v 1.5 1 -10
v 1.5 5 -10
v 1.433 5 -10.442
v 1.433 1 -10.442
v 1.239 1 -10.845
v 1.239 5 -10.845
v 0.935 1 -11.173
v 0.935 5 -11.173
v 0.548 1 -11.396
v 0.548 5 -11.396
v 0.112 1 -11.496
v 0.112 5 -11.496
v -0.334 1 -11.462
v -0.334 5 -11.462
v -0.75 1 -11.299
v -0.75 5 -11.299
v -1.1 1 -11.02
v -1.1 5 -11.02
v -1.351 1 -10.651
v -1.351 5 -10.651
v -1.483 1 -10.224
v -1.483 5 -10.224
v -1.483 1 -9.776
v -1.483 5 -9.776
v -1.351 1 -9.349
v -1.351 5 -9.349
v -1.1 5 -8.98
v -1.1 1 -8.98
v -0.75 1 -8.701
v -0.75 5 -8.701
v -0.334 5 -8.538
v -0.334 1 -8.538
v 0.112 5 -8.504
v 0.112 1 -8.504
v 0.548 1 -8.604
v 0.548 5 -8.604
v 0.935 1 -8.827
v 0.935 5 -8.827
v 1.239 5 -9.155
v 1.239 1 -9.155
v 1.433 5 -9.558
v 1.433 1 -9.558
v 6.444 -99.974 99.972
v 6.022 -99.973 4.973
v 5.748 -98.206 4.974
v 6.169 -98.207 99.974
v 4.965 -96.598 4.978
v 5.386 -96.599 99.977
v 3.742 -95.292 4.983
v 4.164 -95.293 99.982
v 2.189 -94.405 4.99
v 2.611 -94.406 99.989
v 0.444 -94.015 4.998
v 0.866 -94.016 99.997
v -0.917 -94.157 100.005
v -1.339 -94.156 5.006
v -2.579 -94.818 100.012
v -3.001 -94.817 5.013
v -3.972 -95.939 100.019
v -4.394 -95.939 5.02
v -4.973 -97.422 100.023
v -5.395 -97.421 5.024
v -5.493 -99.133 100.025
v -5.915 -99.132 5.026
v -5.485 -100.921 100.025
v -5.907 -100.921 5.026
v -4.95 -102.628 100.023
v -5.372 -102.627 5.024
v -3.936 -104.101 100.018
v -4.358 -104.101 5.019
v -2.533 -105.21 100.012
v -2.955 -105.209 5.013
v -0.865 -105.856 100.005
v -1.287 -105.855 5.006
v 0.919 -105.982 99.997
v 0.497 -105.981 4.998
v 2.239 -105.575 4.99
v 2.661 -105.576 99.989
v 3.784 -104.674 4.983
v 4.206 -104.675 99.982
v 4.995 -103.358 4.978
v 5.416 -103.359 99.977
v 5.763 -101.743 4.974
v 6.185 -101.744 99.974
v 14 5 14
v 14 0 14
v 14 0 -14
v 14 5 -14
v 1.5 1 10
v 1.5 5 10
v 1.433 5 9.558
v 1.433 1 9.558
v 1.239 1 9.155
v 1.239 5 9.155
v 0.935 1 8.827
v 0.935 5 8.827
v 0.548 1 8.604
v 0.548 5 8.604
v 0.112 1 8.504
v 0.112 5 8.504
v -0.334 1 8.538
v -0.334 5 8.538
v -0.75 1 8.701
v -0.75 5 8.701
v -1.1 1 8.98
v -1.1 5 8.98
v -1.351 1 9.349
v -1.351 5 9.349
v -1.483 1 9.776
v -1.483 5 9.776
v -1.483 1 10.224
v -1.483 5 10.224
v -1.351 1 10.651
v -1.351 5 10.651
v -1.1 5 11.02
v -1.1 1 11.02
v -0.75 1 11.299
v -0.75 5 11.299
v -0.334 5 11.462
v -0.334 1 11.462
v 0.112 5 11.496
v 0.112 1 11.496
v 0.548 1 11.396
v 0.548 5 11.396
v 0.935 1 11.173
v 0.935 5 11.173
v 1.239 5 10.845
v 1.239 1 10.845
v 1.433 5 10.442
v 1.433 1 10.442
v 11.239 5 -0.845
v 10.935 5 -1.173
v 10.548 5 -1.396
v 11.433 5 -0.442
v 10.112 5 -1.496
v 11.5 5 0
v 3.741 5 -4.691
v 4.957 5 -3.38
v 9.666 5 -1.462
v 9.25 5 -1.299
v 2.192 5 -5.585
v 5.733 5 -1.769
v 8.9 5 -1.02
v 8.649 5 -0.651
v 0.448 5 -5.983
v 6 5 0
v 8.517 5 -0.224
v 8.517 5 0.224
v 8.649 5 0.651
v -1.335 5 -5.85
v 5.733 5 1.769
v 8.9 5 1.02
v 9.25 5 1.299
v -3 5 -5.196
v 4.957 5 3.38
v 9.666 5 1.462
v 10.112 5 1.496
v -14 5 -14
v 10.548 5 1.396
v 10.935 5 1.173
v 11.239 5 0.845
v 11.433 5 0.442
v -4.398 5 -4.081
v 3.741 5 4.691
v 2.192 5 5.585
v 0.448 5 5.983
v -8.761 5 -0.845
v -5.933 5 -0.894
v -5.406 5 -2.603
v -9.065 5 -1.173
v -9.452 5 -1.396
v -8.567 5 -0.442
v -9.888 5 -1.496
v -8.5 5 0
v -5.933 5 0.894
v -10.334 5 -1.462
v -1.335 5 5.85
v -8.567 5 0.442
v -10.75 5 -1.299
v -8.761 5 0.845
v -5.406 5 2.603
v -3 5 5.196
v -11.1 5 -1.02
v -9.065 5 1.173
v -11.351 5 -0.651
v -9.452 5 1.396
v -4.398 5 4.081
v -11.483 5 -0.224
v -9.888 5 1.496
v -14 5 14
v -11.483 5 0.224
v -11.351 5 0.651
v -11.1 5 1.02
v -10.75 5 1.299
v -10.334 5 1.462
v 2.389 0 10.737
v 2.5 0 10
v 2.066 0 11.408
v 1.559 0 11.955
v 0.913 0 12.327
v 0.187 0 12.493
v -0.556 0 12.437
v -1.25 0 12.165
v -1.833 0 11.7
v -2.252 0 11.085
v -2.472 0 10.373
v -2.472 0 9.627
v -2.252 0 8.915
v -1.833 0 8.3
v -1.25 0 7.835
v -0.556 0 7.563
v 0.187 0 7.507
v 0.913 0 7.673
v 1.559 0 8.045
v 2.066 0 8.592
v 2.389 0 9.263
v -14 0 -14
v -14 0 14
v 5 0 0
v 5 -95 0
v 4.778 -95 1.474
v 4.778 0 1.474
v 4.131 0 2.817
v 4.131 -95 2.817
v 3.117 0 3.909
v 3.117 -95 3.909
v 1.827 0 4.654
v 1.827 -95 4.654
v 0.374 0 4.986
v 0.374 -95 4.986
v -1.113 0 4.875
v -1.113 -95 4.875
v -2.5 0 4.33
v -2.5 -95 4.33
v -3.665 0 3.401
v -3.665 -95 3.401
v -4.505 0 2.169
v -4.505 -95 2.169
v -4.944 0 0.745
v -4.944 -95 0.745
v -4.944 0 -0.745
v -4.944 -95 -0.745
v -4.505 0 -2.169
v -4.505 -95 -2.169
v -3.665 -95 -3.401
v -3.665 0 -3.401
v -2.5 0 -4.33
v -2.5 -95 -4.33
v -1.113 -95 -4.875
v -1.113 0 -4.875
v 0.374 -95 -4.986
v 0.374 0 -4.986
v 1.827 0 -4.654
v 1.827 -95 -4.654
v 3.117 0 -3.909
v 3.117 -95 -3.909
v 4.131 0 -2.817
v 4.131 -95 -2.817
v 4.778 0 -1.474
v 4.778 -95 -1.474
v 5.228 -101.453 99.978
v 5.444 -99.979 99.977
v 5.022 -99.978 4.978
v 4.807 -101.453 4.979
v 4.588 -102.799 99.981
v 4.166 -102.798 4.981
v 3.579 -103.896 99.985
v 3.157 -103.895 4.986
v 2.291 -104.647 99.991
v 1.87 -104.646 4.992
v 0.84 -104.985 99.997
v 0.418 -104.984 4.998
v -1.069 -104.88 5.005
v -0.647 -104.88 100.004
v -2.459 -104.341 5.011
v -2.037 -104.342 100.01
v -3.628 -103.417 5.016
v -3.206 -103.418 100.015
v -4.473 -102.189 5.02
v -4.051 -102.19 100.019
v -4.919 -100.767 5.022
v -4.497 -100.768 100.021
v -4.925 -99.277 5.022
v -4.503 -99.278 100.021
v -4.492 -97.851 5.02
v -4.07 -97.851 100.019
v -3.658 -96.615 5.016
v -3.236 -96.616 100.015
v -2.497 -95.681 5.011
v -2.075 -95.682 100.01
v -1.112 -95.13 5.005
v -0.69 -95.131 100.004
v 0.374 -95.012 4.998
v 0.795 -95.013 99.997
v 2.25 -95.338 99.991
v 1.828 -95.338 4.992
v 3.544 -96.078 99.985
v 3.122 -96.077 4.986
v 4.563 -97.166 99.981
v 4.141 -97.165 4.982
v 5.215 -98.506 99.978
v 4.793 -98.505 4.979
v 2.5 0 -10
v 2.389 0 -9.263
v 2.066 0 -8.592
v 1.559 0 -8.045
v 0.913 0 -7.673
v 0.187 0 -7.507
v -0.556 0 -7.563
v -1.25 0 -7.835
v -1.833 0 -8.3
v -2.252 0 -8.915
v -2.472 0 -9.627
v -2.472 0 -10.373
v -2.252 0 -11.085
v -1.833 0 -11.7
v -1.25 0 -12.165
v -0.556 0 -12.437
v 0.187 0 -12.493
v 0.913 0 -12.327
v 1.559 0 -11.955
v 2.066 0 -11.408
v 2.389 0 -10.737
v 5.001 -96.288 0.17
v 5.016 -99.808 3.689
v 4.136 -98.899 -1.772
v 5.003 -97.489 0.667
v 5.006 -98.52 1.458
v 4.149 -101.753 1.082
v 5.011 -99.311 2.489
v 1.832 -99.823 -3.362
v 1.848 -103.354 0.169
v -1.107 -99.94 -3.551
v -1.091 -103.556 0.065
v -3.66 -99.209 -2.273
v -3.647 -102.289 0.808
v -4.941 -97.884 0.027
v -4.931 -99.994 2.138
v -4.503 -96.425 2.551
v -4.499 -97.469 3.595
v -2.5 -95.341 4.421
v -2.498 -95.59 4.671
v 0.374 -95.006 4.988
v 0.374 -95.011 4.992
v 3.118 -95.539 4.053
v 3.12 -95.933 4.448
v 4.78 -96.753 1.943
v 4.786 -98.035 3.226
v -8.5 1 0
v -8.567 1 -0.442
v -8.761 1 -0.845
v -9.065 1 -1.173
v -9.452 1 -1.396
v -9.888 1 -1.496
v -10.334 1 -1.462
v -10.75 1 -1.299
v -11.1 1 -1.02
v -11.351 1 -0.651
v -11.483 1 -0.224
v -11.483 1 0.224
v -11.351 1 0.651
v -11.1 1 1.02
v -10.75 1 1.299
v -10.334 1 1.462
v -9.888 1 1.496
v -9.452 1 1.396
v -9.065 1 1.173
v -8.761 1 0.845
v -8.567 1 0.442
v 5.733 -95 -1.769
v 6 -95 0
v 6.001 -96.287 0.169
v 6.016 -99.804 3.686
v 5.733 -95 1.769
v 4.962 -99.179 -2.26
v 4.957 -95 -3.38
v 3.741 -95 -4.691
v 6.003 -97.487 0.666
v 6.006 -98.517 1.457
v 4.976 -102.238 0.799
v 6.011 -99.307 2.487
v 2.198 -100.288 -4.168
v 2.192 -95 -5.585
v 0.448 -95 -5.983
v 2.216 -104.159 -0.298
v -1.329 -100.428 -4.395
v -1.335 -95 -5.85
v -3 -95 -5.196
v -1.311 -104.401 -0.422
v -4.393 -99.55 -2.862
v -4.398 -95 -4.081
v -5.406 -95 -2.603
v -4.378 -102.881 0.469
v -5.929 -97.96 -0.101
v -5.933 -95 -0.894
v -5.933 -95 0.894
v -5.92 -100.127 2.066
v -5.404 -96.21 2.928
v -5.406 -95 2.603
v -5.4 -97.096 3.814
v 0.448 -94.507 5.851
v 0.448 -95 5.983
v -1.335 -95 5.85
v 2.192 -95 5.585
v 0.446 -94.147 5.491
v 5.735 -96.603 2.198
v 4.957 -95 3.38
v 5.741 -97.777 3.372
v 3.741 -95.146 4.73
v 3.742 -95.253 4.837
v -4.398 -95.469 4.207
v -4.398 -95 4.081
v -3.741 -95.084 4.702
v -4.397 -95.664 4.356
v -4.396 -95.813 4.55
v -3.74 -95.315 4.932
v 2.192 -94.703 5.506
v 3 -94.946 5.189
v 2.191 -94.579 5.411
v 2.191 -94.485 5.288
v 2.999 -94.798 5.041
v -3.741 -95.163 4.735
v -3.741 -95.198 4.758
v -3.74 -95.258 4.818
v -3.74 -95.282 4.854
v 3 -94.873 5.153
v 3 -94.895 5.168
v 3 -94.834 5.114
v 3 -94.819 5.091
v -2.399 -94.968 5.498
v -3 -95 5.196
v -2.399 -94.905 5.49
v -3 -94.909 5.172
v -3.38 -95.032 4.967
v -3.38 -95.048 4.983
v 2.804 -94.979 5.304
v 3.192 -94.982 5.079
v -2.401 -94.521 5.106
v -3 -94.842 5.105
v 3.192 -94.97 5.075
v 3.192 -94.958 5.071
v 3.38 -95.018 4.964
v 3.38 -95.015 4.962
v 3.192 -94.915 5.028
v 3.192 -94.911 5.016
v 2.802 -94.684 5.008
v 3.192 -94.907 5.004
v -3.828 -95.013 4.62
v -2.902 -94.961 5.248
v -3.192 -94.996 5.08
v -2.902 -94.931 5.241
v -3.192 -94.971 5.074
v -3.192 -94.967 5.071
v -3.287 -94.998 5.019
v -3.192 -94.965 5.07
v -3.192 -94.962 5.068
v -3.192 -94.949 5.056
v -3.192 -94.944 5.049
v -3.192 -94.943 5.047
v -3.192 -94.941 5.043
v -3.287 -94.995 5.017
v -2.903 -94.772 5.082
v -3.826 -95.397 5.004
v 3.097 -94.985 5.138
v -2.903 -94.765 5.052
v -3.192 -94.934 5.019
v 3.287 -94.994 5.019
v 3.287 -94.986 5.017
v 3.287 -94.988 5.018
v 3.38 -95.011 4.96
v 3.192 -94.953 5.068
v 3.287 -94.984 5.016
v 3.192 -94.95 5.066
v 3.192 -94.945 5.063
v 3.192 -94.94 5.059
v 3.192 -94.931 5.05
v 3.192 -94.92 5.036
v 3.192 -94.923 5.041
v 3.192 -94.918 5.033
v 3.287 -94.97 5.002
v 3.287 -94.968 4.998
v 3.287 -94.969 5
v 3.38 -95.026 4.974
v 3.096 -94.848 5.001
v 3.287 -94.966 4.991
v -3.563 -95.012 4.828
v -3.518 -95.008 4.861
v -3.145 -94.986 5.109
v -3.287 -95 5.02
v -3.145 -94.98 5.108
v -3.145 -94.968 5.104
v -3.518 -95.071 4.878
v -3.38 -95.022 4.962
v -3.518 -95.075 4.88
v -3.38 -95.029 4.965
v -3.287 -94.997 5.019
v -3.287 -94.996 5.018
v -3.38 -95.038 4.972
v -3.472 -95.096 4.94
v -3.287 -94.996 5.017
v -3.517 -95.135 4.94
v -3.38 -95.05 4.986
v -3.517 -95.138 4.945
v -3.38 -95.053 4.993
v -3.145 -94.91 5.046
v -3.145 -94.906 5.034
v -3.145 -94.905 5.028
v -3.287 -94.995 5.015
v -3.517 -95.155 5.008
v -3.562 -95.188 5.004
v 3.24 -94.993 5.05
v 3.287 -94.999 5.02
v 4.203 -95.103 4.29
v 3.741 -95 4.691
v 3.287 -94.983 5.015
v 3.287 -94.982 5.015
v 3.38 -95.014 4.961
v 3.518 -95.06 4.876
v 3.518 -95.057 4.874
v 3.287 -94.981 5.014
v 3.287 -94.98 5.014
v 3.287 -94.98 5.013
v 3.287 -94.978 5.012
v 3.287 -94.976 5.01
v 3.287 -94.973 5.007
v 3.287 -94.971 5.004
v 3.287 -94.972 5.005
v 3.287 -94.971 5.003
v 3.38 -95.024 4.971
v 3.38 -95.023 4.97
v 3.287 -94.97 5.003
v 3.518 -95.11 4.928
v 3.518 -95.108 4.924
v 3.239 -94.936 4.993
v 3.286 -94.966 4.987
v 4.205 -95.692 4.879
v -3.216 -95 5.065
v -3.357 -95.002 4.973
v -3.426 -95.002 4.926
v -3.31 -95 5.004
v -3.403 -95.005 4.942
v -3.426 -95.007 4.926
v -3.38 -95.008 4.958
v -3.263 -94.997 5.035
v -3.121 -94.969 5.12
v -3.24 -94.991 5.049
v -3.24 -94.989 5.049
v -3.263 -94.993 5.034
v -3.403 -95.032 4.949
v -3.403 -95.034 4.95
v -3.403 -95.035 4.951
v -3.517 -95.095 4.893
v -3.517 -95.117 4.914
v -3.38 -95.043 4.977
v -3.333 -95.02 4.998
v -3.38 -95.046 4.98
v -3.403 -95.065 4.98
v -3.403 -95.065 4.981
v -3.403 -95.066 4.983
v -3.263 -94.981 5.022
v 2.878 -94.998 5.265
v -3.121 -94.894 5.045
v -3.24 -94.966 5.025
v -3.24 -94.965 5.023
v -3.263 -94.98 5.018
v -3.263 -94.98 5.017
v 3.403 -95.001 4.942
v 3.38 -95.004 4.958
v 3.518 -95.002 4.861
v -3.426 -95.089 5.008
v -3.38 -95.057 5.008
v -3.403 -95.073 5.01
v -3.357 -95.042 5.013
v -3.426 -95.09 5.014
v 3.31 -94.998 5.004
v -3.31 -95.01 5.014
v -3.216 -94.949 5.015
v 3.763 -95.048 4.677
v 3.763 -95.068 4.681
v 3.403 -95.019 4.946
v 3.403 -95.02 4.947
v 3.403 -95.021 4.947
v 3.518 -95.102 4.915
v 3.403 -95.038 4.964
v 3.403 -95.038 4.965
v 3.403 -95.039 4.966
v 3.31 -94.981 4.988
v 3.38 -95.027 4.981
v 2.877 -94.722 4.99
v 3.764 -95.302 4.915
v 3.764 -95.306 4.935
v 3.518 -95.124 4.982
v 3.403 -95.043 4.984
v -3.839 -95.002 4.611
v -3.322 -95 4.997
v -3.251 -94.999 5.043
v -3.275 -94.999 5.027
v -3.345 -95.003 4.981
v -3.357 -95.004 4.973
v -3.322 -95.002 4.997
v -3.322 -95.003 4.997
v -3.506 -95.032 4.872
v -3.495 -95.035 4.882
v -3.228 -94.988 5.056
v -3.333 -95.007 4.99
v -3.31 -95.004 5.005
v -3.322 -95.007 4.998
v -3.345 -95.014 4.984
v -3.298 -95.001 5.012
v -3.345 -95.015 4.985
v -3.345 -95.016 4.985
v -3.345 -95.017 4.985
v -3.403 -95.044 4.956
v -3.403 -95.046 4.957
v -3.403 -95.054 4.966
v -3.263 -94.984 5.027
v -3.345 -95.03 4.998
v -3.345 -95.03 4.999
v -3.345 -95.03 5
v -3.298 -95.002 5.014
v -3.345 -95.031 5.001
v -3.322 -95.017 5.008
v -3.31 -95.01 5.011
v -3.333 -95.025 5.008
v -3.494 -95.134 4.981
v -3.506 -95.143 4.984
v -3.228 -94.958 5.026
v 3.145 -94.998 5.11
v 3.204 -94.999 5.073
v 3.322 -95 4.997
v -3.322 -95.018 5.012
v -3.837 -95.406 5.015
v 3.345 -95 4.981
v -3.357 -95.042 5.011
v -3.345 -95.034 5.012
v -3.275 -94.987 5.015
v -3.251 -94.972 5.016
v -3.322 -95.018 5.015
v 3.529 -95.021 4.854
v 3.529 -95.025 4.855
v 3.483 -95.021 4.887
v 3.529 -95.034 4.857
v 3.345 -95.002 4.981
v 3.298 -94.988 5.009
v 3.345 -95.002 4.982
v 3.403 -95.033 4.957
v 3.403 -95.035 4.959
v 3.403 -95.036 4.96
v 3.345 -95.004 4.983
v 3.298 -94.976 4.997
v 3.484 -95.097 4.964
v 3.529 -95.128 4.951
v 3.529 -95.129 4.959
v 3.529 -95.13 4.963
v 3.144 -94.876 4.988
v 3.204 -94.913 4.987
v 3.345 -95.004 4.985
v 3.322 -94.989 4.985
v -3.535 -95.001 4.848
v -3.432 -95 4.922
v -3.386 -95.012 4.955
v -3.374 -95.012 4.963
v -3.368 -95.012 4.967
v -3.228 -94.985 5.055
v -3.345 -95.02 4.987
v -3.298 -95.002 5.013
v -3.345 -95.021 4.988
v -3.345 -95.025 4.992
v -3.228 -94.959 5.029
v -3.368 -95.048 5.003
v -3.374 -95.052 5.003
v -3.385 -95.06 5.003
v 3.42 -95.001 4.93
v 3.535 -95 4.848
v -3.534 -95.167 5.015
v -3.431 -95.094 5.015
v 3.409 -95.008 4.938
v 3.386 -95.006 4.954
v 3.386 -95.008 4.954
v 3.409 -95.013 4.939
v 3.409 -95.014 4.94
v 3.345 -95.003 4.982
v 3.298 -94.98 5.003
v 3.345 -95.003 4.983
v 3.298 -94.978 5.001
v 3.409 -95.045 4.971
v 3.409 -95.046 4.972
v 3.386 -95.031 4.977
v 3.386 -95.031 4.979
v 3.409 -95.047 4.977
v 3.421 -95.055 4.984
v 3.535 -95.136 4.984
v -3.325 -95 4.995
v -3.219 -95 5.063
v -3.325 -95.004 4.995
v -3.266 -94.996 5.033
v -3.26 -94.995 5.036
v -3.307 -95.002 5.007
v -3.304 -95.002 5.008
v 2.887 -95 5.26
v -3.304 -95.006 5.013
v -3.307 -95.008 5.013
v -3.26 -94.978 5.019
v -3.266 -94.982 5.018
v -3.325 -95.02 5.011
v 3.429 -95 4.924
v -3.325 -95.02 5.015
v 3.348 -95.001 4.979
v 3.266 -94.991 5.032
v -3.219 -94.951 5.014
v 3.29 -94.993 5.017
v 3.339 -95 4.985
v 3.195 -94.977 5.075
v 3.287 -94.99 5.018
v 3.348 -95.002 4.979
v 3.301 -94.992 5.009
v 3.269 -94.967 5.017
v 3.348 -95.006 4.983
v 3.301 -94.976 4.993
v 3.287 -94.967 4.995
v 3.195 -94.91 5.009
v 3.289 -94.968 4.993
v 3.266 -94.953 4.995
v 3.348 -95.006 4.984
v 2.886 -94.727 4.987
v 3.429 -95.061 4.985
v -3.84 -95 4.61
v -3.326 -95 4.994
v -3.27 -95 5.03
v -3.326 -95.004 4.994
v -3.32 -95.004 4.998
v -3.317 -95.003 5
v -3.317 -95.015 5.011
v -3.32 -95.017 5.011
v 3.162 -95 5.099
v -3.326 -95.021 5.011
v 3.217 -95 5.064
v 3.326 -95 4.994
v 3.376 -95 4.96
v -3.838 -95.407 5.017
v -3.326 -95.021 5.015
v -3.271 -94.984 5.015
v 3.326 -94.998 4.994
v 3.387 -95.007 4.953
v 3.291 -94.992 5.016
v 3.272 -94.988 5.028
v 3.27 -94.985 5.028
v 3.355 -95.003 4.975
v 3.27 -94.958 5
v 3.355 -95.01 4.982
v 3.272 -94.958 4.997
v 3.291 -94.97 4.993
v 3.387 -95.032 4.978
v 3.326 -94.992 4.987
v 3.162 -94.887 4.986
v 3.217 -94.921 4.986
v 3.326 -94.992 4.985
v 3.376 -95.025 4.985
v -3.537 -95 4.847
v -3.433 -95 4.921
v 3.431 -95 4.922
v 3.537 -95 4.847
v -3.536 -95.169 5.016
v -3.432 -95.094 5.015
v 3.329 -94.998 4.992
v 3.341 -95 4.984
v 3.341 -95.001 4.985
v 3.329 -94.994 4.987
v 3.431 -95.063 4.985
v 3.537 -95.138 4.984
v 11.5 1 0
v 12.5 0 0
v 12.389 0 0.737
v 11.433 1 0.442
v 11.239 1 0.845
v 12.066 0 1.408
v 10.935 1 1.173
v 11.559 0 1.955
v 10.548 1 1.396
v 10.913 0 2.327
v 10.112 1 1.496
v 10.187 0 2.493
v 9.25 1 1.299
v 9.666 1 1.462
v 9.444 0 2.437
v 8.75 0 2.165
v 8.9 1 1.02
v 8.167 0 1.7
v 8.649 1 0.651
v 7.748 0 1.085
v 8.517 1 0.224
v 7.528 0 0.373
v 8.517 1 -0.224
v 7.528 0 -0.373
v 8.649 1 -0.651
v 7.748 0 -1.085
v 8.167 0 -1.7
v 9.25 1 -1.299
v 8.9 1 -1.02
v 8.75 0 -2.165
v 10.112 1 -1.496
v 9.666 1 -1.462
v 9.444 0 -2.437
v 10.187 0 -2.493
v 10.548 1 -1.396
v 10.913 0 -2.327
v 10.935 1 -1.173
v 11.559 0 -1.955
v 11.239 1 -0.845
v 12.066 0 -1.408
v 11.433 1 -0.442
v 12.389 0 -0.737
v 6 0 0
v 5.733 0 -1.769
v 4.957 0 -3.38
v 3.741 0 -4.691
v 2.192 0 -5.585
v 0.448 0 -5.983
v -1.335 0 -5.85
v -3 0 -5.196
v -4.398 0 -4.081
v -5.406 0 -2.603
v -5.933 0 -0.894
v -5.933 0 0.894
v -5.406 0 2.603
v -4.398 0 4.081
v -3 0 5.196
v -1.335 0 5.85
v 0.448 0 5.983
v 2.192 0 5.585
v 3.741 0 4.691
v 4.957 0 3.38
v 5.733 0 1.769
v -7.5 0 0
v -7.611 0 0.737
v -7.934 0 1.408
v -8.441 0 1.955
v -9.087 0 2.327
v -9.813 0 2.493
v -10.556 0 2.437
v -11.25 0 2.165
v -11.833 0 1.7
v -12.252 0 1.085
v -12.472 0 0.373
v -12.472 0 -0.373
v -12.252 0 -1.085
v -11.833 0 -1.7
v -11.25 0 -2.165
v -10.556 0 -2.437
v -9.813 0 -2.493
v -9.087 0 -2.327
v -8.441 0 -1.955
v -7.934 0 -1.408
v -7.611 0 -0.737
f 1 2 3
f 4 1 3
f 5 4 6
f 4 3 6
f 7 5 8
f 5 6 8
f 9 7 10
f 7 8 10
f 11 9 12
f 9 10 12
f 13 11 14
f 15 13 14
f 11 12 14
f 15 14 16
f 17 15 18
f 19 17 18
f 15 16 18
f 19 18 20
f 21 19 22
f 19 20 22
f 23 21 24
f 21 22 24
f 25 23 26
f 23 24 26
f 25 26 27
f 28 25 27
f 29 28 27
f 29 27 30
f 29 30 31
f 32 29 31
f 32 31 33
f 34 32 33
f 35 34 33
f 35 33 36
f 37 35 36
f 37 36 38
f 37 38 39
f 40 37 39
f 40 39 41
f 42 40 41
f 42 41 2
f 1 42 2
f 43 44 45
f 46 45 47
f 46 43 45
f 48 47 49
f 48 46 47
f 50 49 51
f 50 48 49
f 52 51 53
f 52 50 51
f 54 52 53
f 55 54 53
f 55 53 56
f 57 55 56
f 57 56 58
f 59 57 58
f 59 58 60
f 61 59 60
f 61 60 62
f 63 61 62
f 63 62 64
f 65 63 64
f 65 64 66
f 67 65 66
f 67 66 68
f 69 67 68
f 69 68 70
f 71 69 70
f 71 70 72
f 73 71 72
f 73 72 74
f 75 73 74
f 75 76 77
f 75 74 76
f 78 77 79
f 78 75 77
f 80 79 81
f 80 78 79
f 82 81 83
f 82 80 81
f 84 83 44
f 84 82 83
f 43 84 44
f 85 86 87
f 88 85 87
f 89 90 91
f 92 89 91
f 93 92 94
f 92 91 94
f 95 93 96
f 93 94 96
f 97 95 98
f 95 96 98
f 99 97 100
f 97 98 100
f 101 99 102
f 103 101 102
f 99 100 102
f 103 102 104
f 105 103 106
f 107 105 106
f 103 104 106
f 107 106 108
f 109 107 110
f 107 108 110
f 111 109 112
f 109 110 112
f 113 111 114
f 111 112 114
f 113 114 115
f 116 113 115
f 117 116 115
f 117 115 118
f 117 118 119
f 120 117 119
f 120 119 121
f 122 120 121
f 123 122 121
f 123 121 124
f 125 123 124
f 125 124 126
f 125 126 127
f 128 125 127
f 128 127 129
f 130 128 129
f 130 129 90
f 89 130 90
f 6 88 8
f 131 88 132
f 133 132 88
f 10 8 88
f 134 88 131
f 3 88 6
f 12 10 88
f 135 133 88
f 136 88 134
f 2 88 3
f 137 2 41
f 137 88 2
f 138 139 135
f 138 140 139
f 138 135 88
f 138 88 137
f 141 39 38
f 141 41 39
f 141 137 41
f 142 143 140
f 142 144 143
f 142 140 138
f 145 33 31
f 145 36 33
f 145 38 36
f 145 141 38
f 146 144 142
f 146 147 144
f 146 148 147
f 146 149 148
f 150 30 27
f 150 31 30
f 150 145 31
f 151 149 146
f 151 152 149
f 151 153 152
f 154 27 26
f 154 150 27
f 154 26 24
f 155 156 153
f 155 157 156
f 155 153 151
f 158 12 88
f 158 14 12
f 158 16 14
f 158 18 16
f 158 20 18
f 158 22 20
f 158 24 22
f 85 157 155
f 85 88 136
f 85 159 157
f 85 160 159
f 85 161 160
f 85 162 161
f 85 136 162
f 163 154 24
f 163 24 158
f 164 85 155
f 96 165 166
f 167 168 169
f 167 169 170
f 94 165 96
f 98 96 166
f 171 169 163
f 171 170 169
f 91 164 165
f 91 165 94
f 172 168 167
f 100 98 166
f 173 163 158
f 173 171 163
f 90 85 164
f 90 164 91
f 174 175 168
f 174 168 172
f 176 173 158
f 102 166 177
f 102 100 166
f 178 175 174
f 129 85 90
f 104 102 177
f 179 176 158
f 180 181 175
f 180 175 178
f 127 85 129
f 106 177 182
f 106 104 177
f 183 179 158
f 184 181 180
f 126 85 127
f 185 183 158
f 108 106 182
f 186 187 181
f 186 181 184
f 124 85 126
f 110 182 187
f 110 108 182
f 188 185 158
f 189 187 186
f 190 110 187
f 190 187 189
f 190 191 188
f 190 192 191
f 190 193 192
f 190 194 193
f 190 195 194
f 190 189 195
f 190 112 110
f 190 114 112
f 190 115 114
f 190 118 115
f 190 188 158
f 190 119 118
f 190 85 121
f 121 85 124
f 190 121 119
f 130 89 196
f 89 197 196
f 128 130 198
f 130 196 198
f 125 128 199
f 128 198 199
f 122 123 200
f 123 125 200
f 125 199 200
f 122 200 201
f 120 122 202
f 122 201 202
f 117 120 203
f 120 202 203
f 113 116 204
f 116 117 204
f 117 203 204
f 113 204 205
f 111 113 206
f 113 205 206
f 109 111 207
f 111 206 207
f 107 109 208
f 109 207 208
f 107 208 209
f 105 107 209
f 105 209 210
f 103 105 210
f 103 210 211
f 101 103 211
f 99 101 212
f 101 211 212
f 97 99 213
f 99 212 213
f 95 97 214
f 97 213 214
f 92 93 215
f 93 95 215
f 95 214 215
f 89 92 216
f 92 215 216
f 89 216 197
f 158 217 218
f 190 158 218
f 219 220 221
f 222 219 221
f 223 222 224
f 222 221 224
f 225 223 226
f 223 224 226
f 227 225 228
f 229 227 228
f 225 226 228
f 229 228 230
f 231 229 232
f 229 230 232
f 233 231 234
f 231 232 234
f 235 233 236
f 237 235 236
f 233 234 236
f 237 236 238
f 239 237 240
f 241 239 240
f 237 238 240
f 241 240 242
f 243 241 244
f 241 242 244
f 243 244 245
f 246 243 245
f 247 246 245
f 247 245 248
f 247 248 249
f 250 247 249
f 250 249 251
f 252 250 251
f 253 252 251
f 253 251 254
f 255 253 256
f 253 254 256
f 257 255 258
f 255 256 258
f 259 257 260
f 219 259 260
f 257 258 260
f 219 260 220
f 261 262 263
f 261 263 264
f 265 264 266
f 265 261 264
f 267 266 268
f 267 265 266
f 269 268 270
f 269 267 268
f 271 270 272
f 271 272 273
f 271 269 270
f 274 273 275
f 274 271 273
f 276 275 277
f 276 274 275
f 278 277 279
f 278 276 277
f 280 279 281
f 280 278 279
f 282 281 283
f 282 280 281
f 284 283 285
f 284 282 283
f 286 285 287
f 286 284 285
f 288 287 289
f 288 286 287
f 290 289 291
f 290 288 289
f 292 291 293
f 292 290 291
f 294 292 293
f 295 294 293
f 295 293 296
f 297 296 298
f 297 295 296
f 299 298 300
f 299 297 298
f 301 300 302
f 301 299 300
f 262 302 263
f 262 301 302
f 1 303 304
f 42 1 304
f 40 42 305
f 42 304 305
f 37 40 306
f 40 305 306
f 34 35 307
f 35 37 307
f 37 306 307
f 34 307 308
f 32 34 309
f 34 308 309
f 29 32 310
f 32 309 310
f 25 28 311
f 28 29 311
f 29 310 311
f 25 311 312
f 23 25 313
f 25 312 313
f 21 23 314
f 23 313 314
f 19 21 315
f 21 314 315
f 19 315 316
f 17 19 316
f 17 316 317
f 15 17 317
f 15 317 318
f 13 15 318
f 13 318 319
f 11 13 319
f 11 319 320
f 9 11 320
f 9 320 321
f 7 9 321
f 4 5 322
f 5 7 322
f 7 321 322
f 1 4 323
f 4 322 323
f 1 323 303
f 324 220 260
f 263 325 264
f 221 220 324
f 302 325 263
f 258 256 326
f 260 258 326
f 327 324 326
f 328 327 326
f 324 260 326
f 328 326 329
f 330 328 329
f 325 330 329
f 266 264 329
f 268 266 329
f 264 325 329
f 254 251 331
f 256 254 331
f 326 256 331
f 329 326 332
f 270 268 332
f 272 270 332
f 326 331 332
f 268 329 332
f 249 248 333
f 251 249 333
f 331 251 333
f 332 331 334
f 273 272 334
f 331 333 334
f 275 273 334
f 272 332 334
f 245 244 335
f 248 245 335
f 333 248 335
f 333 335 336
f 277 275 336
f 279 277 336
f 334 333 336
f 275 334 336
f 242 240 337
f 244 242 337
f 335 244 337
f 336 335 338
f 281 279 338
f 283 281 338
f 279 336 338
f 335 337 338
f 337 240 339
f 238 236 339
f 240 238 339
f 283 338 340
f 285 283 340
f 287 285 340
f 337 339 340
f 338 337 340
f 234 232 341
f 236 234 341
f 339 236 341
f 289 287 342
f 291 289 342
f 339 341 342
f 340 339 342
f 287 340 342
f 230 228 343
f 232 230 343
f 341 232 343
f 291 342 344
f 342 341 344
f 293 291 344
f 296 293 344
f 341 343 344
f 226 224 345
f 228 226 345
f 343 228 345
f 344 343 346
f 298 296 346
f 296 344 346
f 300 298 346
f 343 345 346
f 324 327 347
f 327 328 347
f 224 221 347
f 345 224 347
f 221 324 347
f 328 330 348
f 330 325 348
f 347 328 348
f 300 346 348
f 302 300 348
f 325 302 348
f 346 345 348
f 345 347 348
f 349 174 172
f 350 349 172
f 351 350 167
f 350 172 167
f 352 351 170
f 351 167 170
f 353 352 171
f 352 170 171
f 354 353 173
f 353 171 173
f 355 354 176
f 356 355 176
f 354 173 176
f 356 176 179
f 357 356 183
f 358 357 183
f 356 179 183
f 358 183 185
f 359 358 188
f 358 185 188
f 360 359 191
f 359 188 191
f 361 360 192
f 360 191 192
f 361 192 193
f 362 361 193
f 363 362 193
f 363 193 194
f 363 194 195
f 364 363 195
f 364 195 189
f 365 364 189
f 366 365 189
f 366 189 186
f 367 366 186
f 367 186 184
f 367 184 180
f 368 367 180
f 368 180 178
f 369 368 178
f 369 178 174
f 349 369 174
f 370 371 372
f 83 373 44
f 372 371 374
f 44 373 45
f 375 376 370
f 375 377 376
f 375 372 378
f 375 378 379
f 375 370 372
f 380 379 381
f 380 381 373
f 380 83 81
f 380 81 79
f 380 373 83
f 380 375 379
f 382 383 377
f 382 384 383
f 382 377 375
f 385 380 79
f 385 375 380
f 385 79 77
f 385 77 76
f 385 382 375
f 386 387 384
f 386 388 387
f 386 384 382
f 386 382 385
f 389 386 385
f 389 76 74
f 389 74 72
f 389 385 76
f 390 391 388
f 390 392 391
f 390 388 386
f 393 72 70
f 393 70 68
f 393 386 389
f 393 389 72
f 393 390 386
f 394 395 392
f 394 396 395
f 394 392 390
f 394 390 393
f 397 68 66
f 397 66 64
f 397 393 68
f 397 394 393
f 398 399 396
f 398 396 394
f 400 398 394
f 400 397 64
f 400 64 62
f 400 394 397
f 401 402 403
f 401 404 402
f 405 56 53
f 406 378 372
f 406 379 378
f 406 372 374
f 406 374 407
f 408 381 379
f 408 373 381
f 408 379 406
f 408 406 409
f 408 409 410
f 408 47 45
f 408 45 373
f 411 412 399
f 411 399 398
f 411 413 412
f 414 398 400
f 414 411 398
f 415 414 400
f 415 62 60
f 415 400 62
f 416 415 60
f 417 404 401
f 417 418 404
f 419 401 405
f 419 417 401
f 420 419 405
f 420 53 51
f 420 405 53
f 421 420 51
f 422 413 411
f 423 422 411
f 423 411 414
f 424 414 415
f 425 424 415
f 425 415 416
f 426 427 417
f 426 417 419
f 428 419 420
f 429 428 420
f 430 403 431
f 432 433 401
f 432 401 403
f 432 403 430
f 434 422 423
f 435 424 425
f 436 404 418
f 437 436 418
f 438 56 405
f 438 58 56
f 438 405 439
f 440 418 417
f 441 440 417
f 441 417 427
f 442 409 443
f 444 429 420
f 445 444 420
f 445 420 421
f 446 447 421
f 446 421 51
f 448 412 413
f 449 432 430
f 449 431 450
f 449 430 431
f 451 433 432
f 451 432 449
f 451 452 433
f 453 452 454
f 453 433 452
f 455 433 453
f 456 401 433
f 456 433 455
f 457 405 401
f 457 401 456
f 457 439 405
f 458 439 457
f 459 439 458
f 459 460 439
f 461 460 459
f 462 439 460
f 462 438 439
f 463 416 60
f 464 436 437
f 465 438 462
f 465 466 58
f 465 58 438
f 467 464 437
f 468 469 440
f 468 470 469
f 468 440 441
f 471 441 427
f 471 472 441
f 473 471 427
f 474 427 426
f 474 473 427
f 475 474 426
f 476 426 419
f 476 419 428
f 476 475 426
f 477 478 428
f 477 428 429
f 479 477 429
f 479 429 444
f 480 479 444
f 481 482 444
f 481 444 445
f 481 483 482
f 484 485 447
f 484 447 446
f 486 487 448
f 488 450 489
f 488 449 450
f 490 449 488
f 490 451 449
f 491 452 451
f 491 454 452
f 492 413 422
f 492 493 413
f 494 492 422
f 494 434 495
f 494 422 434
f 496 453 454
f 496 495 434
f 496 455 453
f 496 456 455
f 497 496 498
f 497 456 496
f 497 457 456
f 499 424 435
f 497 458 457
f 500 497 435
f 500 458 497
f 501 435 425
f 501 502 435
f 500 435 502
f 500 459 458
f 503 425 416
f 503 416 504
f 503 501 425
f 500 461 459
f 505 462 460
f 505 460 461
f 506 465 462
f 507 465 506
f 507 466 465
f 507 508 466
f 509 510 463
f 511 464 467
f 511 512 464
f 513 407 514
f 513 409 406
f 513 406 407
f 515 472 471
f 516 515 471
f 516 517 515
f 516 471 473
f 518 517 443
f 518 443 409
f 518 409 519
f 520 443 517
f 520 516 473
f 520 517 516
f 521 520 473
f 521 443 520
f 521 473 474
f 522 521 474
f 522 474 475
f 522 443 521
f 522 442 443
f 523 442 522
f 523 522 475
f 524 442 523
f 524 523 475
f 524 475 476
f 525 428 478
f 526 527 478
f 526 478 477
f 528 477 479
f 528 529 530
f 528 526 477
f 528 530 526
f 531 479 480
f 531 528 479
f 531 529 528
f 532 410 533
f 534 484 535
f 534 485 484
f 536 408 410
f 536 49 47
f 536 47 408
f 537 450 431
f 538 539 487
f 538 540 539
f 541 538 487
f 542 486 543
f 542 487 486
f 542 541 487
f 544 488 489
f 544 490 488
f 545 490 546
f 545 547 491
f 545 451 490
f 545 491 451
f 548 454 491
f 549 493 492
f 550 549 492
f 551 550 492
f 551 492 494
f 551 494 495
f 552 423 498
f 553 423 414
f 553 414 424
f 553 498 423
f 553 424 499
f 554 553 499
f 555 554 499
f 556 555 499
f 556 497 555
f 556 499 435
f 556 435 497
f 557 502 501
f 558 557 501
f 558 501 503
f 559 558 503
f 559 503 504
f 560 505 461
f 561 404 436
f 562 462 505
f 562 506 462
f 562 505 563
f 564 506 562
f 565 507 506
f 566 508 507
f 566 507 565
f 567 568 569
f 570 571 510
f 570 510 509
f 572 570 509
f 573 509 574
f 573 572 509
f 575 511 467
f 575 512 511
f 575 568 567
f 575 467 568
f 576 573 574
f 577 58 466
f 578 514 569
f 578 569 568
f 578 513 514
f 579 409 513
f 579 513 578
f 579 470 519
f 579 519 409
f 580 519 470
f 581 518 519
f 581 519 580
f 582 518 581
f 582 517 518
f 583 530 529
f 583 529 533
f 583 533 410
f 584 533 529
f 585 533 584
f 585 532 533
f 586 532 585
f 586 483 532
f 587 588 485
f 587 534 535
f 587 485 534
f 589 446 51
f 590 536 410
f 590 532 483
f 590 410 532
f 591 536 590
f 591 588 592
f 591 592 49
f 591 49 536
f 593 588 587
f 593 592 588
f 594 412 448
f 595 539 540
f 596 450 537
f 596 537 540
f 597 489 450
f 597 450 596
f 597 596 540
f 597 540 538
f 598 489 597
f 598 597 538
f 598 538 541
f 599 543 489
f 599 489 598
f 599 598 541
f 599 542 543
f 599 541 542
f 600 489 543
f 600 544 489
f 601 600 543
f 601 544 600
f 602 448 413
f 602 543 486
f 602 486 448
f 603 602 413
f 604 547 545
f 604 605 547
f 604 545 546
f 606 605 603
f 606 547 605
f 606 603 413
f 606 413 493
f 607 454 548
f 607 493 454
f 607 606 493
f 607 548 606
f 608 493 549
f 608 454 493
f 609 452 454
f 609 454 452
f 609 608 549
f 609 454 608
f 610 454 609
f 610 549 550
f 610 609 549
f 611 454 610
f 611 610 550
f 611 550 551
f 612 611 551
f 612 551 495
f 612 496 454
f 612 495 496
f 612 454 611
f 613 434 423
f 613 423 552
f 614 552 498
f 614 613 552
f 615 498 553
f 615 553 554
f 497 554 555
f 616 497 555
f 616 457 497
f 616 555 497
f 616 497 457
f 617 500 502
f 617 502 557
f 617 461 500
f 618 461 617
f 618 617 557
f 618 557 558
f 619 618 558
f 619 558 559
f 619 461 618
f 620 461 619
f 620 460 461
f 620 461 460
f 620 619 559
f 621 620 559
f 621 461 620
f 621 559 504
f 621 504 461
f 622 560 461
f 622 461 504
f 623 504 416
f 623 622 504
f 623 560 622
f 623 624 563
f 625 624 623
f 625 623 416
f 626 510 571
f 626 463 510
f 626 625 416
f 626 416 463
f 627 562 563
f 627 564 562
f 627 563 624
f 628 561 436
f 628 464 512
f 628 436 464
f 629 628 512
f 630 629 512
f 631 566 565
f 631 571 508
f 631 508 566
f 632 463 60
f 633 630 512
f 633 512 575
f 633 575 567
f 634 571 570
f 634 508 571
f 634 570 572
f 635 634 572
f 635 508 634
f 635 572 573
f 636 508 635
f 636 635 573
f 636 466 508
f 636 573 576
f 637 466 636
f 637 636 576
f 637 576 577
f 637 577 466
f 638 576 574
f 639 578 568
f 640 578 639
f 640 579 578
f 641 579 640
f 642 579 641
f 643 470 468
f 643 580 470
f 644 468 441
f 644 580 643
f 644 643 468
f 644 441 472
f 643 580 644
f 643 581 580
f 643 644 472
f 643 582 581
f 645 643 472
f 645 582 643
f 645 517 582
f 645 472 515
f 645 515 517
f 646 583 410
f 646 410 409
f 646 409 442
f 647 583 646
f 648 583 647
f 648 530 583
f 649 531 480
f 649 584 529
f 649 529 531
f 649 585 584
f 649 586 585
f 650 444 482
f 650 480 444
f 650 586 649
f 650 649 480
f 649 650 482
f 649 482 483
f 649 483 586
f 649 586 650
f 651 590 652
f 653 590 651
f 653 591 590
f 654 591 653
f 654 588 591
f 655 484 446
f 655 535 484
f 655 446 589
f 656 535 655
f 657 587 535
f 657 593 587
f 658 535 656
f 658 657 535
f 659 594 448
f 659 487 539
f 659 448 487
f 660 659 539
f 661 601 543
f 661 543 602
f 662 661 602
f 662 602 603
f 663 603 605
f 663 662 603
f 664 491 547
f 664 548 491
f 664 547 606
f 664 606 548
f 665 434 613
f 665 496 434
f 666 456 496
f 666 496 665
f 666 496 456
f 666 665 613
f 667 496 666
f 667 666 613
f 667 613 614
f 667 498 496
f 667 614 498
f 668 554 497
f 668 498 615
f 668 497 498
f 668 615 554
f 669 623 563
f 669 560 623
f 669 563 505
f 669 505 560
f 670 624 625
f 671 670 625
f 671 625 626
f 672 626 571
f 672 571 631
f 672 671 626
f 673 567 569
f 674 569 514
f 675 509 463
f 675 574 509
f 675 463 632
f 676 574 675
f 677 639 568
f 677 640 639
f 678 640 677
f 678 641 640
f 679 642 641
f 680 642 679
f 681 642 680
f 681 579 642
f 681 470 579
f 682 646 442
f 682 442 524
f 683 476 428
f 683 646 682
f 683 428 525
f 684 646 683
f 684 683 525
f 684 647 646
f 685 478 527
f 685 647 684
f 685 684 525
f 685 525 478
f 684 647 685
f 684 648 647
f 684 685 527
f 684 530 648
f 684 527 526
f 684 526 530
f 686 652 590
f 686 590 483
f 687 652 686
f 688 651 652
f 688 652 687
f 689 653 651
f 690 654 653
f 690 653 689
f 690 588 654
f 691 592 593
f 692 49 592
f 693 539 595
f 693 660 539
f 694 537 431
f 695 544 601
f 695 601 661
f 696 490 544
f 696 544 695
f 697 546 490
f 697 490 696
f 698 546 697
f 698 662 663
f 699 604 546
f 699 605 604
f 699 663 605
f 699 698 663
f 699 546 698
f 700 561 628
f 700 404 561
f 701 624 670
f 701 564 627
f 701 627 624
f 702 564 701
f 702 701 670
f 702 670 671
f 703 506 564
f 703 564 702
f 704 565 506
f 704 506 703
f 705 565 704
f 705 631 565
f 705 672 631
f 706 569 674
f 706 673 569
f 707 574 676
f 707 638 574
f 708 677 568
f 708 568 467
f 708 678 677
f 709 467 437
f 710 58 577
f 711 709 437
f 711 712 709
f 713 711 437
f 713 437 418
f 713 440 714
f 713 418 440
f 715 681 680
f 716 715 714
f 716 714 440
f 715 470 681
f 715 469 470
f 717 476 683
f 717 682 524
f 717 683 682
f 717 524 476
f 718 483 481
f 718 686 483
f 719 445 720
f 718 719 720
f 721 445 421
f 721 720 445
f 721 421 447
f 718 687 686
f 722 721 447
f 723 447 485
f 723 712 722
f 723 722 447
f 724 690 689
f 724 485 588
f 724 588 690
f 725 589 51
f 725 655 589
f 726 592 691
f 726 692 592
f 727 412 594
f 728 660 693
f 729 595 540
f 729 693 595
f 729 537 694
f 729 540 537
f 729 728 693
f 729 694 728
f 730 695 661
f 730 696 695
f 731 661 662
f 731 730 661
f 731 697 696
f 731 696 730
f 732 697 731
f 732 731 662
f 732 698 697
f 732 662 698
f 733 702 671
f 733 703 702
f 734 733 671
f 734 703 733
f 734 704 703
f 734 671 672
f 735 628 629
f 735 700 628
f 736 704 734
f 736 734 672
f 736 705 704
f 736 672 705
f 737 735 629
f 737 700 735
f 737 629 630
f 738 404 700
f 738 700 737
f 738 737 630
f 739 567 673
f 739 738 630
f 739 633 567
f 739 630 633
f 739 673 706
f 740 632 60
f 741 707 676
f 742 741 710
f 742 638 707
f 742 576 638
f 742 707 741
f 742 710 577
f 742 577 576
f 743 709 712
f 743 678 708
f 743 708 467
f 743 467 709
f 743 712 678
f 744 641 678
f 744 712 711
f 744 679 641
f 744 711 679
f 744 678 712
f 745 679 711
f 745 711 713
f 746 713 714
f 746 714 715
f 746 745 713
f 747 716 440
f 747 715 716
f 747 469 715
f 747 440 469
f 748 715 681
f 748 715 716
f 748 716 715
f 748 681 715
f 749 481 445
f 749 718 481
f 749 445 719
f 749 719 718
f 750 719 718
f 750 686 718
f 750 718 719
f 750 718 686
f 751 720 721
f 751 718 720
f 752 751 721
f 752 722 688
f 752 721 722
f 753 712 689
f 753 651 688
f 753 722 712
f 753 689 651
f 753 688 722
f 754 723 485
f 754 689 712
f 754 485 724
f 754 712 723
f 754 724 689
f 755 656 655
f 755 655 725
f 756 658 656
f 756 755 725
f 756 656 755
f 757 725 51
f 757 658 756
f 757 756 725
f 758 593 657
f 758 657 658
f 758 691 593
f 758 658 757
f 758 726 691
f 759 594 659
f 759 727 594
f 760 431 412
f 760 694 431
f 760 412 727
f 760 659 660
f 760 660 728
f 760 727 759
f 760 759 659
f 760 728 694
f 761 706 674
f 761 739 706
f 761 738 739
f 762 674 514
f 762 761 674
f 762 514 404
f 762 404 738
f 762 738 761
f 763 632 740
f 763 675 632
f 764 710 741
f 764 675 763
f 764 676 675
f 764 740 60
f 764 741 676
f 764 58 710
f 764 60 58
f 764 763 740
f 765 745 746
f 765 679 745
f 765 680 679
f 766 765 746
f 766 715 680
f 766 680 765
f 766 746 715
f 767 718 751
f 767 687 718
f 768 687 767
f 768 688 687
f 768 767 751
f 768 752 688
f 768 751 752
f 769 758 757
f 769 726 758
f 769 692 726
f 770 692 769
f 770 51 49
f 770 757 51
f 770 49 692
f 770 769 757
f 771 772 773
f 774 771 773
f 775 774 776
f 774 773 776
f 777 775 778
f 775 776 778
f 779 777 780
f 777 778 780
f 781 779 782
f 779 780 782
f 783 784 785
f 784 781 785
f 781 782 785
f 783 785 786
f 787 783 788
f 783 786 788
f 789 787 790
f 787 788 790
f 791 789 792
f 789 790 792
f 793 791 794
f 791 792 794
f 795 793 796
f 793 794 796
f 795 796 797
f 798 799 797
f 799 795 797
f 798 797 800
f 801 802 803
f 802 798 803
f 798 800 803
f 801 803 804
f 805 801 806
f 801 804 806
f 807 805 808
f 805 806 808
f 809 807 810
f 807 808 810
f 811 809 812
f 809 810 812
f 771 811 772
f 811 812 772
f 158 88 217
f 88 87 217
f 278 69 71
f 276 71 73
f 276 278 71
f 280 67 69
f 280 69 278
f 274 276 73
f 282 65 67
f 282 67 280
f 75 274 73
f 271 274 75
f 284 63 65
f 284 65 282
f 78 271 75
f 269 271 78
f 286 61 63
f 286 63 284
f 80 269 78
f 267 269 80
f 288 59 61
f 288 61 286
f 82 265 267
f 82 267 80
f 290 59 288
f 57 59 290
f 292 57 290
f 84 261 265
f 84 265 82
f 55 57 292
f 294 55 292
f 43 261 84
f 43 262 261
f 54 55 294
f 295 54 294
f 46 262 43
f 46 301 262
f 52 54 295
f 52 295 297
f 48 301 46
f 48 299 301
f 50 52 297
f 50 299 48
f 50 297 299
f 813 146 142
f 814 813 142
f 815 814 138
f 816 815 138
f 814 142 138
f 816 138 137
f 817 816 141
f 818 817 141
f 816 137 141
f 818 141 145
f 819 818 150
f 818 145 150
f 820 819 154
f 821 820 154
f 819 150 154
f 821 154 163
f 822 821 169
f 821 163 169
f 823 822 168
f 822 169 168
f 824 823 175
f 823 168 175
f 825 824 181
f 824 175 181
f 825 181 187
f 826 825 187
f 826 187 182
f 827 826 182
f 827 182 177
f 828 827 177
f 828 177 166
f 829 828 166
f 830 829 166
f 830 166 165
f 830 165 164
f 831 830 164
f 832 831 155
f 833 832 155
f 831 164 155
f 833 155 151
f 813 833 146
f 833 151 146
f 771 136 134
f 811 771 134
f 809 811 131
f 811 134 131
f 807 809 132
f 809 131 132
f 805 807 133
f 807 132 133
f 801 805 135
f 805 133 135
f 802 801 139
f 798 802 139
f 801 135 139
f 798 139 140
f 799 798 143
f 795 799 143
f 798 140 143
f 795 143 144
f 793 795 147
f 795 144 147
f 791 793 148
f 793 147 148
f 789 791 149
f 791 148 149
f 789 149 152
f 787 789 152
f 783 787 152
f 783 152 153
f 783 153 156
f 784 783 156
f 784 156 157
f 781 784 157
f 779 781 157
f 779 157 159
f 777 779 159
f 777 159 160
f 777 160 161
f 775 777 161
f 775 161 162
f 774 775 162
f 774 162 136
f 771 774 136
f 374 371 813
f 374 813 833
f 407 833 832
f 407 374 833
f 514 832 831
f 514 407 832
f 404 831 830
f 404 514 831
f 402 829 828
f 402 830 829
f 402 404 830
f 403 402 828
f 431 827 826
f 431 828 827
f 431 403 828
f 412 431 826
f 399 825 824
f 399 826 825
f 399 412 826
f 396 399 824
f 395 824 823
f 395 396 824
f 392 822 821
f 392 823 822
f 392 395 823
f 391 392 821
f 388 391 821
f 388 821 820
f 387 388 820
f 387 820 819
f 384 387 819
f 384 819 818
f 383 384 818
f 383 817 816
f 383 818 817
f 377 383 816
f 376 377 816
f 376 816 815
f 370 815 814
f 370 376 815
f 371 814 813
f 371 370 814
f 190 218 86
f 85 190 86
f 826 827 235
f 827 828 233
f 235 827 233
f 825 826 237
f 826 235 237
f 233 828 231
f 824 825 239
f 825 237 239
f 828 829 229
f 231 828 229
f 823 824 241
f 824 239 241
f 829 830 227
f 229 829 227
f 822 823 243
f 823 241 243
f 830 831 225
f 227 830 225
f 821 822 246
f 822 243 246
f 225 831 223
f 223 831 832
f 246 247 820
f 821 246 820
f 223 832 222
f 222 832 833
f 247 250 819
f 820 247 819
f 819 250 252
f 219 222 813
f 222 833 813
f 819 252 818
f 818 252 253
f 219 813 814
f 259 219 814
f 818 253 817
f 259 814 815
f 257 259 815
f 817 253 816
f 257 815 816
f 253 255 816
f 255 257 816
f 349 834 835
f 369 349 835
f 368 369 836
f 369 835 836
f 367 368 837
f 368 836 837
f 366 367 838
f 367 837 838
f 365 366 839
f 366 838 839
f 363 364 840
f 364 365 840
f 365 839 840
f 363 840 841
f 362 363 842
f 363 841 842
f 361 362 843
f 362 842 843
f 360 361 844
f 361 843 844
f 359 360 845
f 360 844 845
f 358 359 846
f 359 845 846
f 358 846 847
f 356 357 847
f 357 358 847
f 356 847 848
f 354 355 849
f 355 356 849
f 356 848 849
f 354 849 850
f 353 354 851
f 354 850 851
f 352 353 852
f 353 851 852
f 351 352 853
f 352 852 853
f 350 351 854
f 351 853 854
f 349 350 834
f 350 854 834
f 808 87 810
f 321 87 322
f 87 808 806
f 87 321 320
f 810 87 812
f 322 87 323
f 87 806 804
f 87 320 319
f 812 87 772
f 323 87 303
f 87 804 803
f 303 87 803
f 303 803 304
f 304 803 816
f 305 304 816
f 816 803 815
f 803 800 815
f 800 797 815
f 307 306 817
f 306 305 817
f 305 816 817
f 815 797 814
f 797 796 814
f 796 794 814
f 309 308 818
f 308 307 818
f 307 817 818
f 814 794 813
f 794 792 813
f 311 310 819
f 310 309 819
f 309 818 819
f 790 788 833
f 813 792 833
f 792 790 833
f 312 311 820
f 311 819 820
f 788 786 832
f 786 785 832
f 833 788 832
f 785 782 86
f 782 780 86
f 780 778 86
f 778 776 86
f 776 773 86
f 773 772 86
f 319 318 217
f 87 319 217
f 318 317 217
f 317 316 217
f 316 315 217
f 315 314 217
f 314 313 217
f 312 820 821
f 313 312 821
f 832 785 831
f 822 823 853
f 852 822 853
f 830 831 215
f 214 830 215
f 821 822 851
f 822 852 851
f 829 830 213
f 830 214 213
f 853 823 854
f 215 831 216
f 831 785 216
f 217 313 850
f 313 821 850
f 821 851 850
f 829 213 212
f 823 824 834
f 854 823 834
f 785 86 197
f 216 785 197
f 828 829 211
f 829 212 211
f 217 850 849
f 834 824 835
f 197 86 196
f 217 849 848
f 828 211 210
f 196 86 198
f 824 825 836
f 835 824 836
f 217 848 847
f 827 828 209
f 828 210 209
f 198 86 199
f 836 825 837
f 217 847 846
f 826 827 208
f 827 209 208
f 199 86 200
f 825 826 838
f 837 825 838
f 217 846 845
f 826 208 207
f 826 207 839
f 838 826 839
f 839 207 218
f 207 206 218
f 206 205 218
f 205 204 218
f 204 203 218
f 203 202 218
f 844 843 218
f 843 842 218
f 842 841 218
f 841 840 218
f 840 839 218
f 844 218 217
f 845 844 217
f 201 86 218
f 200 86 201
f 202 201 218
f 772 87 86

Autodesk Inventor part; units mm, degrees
ref_plane "YZ Plane" through (0, 0, 0) normal (1, 0, 0) x (0, 1, 0)
ref_plane "XZ Plane" through (0, 0, 0) normal (0, 1, 0) x (-1, 0, 0)
ref_plane "XY Plane" through (0, 0, 0) normal (0, 0, 1) x (1, 0, 0)
sketch "Sketch1" plane through (0, 0, 0) normal (0, 1, 0) x (-1, 0, 0)
  line L0 (14, 14) -> (-14, 14)
  line L1 (-14, 14) -> (-14, -14)
  line L2 (-14, -14) -> (14, -14)
  line L3 (14, -14) -> (14, 14)
  point P0 (0, 0)
  point P1 (0, -14)
  dimension "d0" = 28
  dimension "d1" = 28
  dimension "d2" = 14
  dimension "d3" = 14
extrude "Extrusion1" add sketch "Sketch1" along normal blind 5
sketch "Sketch2" plane through (0, 5, 0) normal (0, 1, 0) x (1, 0, 0)
  circle A0 centre (0, 0) radius 6
  circle A1 centre (-10, 0) radius 1.5
  circle A2 centre (0, -10) radius 1.5
  circle A3 centre (10, 0) radius 1.5
  circle A4 centre (0, 10) radius 1.5
  dimension "d6" = 12
  dimension "d7" = 3
  dimension "d8" = 10
  dimension "d11" = 360
extrude "Extrusion2" cut sketch "Sketch2" against normal blind 5
ref_plane "Work Plane1" through (14, 0, 0) normal (0, 0, -1) x (-1, 0, 0)
sketch "Sketch3" plane through (14, 0, 0) normal (0, 0, -1) x (-1, 0, 0)
  point P0 (14, 0)
sketch "Sketch4" plane through (0, 0, 0) normal (0, -1, 0) x (1, 0, 0)
  circle A0 centre (0, 0) radius 6
  circle A1 centre (0, 0) radius 5
  dimension "d19" = 10
  dimension "d22" = 12
sketch3d "3D Sketch1"
  line L0 (0, 0, 0) -> (0, -95, 0)
  arc A0 (0, -95, 0) -> (0.0222, -100, 4.9999) centre (0.0222, -95, 5) ccw
  line L1 (0.0222, -100, 4.9999) -> (0.4439, -100.0008, 99.999)
  dimension "d16" = 100
  dimension "d17" = 100
  dimension "d18" = 5
sweep "Sweep1" add profiles "Sketch4" path "3D Sketch1"
chamfer "Chamfer1" distance 1 angle 45 4 edges at (8.5, 0, 0) (-1.5, 0, 10) (-1.5, 0, -10) (-11.5, 0, 0)
ref_plane "Work Plane2" through (-14, 0, 29) normal (0, 0, 1) x (1, 0, 0)
properties part number "water tube to pump"
